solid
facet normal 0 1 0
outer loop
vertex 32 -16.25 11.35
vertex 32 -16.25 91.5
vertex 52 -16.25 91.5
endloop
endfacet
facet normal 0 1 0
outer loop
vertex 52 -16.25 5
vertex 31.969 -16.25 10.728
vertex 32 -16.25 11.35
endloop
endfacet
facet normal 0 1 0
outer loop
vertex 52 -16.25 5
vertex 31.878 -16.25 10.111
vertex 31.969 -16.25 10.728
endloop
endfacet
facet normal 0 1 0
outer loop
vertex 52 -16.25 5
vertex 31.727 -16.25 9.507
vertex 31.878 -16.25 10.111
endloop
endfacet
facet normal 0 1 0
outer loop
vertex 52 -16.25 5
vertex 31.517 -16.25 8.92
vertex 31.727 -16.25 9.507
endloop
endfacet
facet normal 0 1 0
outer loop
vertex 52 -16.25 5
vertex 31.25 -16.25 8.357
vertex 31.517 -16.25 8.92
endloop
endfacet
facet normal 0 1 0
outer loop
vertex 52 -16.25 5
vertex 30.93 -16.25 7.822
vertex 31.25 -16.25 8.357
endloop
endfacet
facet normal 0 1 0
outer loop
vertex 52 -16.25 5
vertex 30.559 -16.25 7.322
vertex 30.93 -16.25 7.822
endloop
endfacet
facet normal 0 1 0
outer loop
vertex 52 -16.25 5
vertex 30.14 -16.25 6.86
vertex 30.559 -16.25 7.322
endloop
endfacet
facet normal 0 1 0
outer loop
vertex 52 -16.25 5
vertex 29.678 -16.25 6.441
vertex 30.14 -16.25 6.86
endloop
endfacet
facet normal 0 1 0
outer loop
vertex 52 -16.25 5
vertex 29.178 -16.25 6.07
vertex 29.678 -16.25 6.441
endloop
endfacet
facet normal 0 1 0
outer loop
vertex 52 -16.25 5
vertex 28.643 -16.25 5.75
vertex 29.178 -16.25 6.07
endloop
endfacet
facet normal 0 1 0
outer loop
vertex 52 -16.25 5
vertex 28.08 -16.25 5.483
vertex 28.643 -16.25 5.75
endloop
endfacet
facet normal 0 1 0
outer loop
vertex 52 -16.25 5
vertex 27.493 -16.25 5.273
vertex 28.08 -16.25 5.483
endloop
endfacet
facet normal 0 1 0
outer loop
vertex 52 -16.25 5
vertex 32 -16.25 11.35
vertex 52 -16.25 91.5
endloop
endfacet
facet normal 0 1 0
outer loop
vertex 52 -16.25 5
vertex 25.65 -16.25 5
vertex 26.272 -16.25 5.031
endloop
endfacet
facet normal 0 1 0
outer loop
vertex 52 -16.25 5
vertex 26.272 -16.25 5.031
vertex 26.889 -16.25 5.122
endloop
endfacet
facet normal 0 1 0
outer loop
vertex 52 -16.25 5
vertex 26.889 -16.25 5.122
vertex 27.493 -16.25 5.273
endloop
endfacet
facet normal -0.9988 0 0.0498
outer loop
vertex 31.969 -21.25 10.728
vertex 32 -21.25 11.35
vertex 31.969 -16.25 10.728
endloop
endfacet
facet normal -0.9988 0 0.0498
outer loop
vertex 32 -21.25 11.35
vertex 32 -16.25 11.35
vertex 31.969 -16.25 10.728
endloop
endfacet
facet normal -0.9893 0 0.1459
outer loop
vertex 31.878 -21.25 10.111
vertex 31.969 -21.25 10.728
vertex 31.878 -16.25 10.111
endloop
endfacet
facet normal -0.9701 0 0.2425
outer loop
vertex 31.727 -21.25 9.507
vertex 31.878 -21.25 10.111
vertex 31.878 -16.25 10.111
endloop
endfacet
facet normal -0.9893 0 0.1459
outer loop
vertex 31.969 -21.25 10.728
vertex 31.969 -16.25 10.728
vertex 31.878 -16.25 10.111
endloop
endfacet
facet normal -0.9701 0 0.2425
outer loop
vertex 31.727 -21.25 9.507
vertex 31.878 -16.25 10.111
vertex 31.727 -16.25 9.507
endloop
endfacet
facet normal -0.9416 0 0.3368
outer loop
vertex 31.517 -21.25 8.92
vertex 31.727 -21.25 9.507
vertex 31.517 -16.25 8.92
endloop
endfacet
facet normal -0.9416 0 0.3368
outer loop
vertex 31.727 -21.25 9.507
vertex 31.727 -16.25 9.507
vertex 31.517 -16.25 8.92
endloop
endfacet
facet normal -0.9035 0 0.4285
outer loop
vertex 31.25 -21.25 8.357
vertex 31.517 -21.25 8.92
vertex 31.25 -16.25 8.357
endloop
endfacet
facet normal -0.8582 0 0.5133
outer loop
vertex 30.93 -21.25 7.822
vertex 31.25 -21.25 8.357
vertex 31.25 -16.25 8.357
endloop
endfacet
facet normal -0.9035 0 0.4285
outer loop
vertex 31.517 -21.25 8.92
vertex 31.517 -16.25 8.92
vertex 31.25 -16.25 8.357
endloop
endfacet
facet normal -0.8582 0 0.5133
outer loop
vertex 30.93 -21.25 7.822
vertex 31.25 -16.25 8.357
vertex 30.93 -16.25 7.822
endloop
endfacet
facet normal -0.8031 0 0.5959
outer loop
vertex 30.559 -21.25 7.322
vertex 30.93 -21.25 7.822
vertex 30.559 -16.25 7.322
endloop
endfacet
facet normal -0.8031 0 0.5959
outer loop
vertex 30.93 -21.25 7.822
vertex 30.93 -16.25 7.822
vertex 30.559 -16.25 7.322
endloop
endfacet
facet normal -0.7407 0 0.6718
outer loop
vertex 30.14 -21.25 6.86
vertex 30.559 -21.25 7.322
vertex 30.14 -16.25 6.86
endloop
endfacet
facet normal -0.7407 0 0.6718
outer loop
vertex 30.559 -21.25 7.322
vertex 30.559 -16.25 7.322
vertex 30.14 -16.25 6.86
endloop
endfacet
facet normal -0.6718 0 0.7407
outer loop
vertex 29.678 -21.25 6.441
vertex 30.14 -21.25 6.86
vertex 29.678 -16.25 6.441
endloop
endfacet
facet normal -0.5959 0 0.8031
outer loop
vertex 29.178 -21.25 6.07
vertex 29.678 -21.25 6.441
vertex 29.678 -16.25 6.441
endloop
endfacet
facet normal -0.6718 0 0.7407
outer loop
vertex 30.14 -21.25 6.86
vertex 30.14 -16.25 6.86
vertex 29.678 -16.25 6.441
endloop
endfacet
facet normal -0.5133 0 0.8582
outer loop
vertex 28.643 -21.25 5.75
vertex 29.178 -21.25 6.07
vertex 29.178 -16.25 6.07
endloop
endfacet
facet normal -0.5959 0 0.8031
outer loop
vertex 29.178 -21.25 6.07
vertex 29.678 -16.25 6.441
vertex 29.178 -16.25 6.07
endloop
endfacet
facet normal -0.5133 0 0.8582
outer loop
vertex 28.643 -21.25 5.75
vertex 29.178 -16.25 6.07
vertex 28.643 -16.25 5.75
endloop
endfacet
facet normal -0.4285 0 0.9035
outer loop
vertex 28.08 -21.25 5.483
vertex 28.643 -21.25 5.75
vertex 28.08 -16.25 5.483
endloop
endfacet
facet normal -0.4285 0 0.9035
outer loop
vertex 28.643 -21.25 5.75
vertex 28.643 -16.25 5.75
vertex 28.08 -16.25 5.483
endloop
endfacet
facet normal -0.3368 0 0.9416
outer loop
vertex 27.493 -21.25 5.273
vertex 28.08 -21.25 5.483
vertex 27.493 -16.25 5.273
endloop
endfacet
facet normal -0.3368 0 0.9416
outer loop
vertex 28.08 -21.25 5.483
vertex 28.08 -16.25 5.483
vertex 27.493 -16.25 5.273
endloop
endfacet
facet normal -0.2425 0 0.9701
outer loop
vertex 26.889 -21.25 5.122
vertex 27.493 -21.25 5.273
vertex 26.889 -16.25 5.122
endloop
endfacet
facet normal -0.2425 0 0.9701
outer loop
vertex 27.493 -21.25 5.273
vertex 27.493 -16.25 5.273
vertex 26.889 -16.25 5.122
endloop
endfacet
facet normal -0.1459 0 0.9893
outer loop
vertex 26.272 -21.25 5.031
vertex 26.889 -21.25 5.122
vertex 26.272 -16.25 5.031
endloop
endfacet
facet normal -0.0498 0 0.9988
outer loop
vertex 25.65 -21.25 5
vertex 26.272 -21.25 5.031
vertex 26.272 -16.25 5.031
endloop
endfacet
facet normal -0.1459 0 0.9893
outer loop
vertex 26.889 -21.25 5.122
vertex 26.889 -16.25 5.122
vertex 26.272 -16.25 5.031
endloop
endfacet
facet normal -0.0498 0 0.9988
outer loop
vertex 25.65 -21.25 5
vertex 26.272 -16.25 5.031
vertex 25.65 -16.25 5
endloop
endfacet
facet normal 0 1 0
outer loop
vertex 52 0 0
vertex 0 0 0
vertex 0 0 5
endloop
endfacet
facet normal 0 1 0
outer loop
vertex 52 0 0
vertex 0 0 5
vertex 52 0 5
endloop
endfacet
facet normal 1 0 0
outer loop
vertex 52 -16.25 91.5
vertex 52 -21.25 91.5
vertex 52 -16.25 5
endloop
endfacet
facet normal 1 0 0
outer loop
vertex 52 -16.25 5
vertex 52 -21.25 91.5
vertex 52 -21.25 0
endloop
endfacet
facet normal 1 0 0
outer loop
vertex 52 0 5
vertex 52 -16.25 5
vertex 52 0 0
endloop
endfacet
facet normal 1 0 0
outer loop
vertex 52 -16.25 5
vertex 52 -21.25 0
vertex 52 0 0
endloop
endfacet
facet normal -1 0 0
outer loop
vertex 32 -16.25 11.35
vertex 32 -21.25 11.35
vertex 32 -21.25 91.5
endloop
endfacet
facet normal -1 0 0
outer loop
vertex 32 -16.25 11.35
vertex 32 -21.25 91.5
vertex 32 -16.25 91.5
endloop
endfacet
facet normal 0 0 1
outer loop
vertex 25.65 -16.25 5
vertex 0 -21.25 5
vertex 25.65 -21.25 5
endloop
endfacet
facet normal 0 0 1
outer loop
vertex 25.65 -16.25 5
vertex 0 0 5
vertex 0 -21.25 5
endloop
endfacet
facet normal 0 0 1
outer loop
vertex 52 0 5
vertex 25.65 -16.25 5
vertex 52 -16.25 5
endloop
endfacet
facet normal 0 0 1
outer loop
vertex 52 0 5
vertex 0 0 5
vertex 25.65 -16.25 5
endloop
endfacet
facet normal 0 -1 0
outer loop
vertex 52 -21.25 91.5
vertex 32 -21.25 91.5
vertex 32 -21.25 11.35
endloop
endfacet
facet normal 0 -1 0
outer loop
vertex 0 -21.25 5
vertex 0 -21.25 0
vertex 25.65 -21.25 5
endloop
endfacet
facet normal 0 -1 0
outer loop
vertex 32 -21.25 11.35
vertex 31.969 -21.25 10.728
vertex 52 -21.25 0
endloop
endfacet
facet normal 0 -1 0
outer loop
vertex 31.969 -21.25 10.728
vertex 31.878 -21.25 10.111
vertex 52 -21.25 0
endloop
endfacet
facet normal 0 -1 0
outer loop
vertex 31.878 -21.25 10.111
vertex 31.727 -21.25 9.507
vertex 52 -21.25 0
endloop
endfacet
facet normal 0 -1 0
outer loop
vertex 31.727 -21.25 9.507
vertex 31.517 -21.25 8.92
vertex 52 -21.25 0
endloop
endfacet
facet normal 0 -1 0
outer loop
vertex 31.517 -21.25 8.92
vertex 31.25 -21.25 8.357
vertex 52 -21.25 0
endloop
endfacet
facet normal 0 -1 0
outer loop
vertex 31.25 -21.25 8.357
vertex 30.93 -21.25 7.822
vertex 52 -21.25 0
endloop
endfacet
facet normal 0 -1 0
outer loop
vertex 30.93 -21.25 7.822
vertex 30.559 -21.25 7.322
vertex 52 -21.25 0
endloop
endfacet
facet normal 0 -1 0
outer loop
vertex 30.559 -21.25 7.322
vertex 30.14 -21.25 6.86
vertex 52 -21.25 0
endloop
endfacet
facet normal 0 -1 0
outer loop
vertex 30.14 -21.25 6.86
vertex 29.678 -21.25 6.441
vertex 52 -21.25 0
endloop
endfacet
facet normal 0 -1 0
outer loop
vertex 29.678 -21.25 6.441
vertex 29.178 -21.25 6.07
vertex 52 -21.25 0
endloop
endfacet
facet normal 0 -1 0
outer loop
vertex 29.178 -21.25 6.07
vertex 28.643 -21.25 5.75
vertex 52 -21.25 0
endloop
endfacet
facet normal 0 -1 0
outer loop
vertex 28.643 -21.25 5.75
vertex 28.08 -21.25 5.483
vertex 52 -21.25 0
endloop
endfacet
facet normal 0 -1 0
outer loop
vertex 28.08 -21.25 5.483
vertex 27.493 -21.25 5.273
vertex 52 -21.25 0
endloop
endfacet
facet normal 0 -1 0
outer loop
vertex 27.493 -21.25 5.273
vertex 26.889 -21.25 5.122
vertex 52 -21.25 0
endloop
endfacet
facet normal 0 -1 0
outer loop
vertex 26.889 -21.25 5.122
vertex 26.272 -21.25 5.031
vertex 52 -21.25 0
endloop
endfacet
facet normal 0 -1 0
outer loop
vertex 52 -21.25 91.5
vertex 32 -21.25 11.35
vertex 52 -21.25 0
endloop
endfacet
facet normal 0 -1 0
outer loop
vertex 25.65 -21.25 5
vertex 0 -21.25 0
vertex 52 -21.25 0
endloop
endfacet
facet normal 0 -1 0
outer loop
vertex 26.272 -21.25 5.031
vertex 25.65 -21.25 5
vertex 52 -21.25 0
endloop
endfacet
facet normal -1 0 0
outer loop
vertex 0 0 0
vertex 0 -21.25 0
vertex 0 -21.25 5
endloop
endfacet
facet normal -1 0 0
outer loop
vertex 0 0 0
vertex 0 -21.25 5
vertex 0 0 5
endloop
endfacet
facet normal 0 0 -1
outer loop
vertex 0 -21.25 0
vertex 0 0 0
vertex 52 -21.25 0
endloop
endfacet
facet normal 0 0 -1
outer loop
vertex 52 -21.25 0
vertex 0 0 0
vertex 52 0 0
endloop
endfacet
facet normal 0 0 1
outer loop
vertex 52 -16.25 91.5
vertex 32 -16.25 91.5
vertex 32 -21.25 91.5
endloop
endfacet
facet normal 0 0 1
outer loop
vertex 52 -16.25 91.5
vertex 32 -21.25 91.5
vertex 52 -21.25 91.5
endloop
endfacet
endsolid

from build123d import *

# Parameters (mm, degrees)
SKETCH1_W      = 52
SKETCH1_H      = 21.25
EXTRUDE1_DEPTH = 5
SKETCH2_W      = 20
SKETCH2_H      = 5
EXTRUDE2_DEPTH = 86.5
FILLET1_R      = 6.35


with BuildPart() as part:
    # Sketch1 → Extrude1 (new body)
    with BuildSketch(Plane.XY):
        with Locations((26, -10.625)):
            Rectangle(SKETCH1_W, SKETCH1_H)
    extrude(amount=EXTRUDE1_DEPTH)

    # Sketch2 → Extrude2 (add)
    with BuildSketch(Plane.XY.offset(5)):
        with Locations((42, -18.75)):
            Rectangle(SKETCH2_W, SKETCH2_H)
    extrude(amount=EXTRUDE2_DEPTH)

    # Fillet1
    fillet1_edges = [part.edges().sort_by_distance(p)[0] for p in [
        (32, -18.75, 5),
    ]]
    fillet(fillet1_edges, radius=FILLET1_R)


solid = part.part
